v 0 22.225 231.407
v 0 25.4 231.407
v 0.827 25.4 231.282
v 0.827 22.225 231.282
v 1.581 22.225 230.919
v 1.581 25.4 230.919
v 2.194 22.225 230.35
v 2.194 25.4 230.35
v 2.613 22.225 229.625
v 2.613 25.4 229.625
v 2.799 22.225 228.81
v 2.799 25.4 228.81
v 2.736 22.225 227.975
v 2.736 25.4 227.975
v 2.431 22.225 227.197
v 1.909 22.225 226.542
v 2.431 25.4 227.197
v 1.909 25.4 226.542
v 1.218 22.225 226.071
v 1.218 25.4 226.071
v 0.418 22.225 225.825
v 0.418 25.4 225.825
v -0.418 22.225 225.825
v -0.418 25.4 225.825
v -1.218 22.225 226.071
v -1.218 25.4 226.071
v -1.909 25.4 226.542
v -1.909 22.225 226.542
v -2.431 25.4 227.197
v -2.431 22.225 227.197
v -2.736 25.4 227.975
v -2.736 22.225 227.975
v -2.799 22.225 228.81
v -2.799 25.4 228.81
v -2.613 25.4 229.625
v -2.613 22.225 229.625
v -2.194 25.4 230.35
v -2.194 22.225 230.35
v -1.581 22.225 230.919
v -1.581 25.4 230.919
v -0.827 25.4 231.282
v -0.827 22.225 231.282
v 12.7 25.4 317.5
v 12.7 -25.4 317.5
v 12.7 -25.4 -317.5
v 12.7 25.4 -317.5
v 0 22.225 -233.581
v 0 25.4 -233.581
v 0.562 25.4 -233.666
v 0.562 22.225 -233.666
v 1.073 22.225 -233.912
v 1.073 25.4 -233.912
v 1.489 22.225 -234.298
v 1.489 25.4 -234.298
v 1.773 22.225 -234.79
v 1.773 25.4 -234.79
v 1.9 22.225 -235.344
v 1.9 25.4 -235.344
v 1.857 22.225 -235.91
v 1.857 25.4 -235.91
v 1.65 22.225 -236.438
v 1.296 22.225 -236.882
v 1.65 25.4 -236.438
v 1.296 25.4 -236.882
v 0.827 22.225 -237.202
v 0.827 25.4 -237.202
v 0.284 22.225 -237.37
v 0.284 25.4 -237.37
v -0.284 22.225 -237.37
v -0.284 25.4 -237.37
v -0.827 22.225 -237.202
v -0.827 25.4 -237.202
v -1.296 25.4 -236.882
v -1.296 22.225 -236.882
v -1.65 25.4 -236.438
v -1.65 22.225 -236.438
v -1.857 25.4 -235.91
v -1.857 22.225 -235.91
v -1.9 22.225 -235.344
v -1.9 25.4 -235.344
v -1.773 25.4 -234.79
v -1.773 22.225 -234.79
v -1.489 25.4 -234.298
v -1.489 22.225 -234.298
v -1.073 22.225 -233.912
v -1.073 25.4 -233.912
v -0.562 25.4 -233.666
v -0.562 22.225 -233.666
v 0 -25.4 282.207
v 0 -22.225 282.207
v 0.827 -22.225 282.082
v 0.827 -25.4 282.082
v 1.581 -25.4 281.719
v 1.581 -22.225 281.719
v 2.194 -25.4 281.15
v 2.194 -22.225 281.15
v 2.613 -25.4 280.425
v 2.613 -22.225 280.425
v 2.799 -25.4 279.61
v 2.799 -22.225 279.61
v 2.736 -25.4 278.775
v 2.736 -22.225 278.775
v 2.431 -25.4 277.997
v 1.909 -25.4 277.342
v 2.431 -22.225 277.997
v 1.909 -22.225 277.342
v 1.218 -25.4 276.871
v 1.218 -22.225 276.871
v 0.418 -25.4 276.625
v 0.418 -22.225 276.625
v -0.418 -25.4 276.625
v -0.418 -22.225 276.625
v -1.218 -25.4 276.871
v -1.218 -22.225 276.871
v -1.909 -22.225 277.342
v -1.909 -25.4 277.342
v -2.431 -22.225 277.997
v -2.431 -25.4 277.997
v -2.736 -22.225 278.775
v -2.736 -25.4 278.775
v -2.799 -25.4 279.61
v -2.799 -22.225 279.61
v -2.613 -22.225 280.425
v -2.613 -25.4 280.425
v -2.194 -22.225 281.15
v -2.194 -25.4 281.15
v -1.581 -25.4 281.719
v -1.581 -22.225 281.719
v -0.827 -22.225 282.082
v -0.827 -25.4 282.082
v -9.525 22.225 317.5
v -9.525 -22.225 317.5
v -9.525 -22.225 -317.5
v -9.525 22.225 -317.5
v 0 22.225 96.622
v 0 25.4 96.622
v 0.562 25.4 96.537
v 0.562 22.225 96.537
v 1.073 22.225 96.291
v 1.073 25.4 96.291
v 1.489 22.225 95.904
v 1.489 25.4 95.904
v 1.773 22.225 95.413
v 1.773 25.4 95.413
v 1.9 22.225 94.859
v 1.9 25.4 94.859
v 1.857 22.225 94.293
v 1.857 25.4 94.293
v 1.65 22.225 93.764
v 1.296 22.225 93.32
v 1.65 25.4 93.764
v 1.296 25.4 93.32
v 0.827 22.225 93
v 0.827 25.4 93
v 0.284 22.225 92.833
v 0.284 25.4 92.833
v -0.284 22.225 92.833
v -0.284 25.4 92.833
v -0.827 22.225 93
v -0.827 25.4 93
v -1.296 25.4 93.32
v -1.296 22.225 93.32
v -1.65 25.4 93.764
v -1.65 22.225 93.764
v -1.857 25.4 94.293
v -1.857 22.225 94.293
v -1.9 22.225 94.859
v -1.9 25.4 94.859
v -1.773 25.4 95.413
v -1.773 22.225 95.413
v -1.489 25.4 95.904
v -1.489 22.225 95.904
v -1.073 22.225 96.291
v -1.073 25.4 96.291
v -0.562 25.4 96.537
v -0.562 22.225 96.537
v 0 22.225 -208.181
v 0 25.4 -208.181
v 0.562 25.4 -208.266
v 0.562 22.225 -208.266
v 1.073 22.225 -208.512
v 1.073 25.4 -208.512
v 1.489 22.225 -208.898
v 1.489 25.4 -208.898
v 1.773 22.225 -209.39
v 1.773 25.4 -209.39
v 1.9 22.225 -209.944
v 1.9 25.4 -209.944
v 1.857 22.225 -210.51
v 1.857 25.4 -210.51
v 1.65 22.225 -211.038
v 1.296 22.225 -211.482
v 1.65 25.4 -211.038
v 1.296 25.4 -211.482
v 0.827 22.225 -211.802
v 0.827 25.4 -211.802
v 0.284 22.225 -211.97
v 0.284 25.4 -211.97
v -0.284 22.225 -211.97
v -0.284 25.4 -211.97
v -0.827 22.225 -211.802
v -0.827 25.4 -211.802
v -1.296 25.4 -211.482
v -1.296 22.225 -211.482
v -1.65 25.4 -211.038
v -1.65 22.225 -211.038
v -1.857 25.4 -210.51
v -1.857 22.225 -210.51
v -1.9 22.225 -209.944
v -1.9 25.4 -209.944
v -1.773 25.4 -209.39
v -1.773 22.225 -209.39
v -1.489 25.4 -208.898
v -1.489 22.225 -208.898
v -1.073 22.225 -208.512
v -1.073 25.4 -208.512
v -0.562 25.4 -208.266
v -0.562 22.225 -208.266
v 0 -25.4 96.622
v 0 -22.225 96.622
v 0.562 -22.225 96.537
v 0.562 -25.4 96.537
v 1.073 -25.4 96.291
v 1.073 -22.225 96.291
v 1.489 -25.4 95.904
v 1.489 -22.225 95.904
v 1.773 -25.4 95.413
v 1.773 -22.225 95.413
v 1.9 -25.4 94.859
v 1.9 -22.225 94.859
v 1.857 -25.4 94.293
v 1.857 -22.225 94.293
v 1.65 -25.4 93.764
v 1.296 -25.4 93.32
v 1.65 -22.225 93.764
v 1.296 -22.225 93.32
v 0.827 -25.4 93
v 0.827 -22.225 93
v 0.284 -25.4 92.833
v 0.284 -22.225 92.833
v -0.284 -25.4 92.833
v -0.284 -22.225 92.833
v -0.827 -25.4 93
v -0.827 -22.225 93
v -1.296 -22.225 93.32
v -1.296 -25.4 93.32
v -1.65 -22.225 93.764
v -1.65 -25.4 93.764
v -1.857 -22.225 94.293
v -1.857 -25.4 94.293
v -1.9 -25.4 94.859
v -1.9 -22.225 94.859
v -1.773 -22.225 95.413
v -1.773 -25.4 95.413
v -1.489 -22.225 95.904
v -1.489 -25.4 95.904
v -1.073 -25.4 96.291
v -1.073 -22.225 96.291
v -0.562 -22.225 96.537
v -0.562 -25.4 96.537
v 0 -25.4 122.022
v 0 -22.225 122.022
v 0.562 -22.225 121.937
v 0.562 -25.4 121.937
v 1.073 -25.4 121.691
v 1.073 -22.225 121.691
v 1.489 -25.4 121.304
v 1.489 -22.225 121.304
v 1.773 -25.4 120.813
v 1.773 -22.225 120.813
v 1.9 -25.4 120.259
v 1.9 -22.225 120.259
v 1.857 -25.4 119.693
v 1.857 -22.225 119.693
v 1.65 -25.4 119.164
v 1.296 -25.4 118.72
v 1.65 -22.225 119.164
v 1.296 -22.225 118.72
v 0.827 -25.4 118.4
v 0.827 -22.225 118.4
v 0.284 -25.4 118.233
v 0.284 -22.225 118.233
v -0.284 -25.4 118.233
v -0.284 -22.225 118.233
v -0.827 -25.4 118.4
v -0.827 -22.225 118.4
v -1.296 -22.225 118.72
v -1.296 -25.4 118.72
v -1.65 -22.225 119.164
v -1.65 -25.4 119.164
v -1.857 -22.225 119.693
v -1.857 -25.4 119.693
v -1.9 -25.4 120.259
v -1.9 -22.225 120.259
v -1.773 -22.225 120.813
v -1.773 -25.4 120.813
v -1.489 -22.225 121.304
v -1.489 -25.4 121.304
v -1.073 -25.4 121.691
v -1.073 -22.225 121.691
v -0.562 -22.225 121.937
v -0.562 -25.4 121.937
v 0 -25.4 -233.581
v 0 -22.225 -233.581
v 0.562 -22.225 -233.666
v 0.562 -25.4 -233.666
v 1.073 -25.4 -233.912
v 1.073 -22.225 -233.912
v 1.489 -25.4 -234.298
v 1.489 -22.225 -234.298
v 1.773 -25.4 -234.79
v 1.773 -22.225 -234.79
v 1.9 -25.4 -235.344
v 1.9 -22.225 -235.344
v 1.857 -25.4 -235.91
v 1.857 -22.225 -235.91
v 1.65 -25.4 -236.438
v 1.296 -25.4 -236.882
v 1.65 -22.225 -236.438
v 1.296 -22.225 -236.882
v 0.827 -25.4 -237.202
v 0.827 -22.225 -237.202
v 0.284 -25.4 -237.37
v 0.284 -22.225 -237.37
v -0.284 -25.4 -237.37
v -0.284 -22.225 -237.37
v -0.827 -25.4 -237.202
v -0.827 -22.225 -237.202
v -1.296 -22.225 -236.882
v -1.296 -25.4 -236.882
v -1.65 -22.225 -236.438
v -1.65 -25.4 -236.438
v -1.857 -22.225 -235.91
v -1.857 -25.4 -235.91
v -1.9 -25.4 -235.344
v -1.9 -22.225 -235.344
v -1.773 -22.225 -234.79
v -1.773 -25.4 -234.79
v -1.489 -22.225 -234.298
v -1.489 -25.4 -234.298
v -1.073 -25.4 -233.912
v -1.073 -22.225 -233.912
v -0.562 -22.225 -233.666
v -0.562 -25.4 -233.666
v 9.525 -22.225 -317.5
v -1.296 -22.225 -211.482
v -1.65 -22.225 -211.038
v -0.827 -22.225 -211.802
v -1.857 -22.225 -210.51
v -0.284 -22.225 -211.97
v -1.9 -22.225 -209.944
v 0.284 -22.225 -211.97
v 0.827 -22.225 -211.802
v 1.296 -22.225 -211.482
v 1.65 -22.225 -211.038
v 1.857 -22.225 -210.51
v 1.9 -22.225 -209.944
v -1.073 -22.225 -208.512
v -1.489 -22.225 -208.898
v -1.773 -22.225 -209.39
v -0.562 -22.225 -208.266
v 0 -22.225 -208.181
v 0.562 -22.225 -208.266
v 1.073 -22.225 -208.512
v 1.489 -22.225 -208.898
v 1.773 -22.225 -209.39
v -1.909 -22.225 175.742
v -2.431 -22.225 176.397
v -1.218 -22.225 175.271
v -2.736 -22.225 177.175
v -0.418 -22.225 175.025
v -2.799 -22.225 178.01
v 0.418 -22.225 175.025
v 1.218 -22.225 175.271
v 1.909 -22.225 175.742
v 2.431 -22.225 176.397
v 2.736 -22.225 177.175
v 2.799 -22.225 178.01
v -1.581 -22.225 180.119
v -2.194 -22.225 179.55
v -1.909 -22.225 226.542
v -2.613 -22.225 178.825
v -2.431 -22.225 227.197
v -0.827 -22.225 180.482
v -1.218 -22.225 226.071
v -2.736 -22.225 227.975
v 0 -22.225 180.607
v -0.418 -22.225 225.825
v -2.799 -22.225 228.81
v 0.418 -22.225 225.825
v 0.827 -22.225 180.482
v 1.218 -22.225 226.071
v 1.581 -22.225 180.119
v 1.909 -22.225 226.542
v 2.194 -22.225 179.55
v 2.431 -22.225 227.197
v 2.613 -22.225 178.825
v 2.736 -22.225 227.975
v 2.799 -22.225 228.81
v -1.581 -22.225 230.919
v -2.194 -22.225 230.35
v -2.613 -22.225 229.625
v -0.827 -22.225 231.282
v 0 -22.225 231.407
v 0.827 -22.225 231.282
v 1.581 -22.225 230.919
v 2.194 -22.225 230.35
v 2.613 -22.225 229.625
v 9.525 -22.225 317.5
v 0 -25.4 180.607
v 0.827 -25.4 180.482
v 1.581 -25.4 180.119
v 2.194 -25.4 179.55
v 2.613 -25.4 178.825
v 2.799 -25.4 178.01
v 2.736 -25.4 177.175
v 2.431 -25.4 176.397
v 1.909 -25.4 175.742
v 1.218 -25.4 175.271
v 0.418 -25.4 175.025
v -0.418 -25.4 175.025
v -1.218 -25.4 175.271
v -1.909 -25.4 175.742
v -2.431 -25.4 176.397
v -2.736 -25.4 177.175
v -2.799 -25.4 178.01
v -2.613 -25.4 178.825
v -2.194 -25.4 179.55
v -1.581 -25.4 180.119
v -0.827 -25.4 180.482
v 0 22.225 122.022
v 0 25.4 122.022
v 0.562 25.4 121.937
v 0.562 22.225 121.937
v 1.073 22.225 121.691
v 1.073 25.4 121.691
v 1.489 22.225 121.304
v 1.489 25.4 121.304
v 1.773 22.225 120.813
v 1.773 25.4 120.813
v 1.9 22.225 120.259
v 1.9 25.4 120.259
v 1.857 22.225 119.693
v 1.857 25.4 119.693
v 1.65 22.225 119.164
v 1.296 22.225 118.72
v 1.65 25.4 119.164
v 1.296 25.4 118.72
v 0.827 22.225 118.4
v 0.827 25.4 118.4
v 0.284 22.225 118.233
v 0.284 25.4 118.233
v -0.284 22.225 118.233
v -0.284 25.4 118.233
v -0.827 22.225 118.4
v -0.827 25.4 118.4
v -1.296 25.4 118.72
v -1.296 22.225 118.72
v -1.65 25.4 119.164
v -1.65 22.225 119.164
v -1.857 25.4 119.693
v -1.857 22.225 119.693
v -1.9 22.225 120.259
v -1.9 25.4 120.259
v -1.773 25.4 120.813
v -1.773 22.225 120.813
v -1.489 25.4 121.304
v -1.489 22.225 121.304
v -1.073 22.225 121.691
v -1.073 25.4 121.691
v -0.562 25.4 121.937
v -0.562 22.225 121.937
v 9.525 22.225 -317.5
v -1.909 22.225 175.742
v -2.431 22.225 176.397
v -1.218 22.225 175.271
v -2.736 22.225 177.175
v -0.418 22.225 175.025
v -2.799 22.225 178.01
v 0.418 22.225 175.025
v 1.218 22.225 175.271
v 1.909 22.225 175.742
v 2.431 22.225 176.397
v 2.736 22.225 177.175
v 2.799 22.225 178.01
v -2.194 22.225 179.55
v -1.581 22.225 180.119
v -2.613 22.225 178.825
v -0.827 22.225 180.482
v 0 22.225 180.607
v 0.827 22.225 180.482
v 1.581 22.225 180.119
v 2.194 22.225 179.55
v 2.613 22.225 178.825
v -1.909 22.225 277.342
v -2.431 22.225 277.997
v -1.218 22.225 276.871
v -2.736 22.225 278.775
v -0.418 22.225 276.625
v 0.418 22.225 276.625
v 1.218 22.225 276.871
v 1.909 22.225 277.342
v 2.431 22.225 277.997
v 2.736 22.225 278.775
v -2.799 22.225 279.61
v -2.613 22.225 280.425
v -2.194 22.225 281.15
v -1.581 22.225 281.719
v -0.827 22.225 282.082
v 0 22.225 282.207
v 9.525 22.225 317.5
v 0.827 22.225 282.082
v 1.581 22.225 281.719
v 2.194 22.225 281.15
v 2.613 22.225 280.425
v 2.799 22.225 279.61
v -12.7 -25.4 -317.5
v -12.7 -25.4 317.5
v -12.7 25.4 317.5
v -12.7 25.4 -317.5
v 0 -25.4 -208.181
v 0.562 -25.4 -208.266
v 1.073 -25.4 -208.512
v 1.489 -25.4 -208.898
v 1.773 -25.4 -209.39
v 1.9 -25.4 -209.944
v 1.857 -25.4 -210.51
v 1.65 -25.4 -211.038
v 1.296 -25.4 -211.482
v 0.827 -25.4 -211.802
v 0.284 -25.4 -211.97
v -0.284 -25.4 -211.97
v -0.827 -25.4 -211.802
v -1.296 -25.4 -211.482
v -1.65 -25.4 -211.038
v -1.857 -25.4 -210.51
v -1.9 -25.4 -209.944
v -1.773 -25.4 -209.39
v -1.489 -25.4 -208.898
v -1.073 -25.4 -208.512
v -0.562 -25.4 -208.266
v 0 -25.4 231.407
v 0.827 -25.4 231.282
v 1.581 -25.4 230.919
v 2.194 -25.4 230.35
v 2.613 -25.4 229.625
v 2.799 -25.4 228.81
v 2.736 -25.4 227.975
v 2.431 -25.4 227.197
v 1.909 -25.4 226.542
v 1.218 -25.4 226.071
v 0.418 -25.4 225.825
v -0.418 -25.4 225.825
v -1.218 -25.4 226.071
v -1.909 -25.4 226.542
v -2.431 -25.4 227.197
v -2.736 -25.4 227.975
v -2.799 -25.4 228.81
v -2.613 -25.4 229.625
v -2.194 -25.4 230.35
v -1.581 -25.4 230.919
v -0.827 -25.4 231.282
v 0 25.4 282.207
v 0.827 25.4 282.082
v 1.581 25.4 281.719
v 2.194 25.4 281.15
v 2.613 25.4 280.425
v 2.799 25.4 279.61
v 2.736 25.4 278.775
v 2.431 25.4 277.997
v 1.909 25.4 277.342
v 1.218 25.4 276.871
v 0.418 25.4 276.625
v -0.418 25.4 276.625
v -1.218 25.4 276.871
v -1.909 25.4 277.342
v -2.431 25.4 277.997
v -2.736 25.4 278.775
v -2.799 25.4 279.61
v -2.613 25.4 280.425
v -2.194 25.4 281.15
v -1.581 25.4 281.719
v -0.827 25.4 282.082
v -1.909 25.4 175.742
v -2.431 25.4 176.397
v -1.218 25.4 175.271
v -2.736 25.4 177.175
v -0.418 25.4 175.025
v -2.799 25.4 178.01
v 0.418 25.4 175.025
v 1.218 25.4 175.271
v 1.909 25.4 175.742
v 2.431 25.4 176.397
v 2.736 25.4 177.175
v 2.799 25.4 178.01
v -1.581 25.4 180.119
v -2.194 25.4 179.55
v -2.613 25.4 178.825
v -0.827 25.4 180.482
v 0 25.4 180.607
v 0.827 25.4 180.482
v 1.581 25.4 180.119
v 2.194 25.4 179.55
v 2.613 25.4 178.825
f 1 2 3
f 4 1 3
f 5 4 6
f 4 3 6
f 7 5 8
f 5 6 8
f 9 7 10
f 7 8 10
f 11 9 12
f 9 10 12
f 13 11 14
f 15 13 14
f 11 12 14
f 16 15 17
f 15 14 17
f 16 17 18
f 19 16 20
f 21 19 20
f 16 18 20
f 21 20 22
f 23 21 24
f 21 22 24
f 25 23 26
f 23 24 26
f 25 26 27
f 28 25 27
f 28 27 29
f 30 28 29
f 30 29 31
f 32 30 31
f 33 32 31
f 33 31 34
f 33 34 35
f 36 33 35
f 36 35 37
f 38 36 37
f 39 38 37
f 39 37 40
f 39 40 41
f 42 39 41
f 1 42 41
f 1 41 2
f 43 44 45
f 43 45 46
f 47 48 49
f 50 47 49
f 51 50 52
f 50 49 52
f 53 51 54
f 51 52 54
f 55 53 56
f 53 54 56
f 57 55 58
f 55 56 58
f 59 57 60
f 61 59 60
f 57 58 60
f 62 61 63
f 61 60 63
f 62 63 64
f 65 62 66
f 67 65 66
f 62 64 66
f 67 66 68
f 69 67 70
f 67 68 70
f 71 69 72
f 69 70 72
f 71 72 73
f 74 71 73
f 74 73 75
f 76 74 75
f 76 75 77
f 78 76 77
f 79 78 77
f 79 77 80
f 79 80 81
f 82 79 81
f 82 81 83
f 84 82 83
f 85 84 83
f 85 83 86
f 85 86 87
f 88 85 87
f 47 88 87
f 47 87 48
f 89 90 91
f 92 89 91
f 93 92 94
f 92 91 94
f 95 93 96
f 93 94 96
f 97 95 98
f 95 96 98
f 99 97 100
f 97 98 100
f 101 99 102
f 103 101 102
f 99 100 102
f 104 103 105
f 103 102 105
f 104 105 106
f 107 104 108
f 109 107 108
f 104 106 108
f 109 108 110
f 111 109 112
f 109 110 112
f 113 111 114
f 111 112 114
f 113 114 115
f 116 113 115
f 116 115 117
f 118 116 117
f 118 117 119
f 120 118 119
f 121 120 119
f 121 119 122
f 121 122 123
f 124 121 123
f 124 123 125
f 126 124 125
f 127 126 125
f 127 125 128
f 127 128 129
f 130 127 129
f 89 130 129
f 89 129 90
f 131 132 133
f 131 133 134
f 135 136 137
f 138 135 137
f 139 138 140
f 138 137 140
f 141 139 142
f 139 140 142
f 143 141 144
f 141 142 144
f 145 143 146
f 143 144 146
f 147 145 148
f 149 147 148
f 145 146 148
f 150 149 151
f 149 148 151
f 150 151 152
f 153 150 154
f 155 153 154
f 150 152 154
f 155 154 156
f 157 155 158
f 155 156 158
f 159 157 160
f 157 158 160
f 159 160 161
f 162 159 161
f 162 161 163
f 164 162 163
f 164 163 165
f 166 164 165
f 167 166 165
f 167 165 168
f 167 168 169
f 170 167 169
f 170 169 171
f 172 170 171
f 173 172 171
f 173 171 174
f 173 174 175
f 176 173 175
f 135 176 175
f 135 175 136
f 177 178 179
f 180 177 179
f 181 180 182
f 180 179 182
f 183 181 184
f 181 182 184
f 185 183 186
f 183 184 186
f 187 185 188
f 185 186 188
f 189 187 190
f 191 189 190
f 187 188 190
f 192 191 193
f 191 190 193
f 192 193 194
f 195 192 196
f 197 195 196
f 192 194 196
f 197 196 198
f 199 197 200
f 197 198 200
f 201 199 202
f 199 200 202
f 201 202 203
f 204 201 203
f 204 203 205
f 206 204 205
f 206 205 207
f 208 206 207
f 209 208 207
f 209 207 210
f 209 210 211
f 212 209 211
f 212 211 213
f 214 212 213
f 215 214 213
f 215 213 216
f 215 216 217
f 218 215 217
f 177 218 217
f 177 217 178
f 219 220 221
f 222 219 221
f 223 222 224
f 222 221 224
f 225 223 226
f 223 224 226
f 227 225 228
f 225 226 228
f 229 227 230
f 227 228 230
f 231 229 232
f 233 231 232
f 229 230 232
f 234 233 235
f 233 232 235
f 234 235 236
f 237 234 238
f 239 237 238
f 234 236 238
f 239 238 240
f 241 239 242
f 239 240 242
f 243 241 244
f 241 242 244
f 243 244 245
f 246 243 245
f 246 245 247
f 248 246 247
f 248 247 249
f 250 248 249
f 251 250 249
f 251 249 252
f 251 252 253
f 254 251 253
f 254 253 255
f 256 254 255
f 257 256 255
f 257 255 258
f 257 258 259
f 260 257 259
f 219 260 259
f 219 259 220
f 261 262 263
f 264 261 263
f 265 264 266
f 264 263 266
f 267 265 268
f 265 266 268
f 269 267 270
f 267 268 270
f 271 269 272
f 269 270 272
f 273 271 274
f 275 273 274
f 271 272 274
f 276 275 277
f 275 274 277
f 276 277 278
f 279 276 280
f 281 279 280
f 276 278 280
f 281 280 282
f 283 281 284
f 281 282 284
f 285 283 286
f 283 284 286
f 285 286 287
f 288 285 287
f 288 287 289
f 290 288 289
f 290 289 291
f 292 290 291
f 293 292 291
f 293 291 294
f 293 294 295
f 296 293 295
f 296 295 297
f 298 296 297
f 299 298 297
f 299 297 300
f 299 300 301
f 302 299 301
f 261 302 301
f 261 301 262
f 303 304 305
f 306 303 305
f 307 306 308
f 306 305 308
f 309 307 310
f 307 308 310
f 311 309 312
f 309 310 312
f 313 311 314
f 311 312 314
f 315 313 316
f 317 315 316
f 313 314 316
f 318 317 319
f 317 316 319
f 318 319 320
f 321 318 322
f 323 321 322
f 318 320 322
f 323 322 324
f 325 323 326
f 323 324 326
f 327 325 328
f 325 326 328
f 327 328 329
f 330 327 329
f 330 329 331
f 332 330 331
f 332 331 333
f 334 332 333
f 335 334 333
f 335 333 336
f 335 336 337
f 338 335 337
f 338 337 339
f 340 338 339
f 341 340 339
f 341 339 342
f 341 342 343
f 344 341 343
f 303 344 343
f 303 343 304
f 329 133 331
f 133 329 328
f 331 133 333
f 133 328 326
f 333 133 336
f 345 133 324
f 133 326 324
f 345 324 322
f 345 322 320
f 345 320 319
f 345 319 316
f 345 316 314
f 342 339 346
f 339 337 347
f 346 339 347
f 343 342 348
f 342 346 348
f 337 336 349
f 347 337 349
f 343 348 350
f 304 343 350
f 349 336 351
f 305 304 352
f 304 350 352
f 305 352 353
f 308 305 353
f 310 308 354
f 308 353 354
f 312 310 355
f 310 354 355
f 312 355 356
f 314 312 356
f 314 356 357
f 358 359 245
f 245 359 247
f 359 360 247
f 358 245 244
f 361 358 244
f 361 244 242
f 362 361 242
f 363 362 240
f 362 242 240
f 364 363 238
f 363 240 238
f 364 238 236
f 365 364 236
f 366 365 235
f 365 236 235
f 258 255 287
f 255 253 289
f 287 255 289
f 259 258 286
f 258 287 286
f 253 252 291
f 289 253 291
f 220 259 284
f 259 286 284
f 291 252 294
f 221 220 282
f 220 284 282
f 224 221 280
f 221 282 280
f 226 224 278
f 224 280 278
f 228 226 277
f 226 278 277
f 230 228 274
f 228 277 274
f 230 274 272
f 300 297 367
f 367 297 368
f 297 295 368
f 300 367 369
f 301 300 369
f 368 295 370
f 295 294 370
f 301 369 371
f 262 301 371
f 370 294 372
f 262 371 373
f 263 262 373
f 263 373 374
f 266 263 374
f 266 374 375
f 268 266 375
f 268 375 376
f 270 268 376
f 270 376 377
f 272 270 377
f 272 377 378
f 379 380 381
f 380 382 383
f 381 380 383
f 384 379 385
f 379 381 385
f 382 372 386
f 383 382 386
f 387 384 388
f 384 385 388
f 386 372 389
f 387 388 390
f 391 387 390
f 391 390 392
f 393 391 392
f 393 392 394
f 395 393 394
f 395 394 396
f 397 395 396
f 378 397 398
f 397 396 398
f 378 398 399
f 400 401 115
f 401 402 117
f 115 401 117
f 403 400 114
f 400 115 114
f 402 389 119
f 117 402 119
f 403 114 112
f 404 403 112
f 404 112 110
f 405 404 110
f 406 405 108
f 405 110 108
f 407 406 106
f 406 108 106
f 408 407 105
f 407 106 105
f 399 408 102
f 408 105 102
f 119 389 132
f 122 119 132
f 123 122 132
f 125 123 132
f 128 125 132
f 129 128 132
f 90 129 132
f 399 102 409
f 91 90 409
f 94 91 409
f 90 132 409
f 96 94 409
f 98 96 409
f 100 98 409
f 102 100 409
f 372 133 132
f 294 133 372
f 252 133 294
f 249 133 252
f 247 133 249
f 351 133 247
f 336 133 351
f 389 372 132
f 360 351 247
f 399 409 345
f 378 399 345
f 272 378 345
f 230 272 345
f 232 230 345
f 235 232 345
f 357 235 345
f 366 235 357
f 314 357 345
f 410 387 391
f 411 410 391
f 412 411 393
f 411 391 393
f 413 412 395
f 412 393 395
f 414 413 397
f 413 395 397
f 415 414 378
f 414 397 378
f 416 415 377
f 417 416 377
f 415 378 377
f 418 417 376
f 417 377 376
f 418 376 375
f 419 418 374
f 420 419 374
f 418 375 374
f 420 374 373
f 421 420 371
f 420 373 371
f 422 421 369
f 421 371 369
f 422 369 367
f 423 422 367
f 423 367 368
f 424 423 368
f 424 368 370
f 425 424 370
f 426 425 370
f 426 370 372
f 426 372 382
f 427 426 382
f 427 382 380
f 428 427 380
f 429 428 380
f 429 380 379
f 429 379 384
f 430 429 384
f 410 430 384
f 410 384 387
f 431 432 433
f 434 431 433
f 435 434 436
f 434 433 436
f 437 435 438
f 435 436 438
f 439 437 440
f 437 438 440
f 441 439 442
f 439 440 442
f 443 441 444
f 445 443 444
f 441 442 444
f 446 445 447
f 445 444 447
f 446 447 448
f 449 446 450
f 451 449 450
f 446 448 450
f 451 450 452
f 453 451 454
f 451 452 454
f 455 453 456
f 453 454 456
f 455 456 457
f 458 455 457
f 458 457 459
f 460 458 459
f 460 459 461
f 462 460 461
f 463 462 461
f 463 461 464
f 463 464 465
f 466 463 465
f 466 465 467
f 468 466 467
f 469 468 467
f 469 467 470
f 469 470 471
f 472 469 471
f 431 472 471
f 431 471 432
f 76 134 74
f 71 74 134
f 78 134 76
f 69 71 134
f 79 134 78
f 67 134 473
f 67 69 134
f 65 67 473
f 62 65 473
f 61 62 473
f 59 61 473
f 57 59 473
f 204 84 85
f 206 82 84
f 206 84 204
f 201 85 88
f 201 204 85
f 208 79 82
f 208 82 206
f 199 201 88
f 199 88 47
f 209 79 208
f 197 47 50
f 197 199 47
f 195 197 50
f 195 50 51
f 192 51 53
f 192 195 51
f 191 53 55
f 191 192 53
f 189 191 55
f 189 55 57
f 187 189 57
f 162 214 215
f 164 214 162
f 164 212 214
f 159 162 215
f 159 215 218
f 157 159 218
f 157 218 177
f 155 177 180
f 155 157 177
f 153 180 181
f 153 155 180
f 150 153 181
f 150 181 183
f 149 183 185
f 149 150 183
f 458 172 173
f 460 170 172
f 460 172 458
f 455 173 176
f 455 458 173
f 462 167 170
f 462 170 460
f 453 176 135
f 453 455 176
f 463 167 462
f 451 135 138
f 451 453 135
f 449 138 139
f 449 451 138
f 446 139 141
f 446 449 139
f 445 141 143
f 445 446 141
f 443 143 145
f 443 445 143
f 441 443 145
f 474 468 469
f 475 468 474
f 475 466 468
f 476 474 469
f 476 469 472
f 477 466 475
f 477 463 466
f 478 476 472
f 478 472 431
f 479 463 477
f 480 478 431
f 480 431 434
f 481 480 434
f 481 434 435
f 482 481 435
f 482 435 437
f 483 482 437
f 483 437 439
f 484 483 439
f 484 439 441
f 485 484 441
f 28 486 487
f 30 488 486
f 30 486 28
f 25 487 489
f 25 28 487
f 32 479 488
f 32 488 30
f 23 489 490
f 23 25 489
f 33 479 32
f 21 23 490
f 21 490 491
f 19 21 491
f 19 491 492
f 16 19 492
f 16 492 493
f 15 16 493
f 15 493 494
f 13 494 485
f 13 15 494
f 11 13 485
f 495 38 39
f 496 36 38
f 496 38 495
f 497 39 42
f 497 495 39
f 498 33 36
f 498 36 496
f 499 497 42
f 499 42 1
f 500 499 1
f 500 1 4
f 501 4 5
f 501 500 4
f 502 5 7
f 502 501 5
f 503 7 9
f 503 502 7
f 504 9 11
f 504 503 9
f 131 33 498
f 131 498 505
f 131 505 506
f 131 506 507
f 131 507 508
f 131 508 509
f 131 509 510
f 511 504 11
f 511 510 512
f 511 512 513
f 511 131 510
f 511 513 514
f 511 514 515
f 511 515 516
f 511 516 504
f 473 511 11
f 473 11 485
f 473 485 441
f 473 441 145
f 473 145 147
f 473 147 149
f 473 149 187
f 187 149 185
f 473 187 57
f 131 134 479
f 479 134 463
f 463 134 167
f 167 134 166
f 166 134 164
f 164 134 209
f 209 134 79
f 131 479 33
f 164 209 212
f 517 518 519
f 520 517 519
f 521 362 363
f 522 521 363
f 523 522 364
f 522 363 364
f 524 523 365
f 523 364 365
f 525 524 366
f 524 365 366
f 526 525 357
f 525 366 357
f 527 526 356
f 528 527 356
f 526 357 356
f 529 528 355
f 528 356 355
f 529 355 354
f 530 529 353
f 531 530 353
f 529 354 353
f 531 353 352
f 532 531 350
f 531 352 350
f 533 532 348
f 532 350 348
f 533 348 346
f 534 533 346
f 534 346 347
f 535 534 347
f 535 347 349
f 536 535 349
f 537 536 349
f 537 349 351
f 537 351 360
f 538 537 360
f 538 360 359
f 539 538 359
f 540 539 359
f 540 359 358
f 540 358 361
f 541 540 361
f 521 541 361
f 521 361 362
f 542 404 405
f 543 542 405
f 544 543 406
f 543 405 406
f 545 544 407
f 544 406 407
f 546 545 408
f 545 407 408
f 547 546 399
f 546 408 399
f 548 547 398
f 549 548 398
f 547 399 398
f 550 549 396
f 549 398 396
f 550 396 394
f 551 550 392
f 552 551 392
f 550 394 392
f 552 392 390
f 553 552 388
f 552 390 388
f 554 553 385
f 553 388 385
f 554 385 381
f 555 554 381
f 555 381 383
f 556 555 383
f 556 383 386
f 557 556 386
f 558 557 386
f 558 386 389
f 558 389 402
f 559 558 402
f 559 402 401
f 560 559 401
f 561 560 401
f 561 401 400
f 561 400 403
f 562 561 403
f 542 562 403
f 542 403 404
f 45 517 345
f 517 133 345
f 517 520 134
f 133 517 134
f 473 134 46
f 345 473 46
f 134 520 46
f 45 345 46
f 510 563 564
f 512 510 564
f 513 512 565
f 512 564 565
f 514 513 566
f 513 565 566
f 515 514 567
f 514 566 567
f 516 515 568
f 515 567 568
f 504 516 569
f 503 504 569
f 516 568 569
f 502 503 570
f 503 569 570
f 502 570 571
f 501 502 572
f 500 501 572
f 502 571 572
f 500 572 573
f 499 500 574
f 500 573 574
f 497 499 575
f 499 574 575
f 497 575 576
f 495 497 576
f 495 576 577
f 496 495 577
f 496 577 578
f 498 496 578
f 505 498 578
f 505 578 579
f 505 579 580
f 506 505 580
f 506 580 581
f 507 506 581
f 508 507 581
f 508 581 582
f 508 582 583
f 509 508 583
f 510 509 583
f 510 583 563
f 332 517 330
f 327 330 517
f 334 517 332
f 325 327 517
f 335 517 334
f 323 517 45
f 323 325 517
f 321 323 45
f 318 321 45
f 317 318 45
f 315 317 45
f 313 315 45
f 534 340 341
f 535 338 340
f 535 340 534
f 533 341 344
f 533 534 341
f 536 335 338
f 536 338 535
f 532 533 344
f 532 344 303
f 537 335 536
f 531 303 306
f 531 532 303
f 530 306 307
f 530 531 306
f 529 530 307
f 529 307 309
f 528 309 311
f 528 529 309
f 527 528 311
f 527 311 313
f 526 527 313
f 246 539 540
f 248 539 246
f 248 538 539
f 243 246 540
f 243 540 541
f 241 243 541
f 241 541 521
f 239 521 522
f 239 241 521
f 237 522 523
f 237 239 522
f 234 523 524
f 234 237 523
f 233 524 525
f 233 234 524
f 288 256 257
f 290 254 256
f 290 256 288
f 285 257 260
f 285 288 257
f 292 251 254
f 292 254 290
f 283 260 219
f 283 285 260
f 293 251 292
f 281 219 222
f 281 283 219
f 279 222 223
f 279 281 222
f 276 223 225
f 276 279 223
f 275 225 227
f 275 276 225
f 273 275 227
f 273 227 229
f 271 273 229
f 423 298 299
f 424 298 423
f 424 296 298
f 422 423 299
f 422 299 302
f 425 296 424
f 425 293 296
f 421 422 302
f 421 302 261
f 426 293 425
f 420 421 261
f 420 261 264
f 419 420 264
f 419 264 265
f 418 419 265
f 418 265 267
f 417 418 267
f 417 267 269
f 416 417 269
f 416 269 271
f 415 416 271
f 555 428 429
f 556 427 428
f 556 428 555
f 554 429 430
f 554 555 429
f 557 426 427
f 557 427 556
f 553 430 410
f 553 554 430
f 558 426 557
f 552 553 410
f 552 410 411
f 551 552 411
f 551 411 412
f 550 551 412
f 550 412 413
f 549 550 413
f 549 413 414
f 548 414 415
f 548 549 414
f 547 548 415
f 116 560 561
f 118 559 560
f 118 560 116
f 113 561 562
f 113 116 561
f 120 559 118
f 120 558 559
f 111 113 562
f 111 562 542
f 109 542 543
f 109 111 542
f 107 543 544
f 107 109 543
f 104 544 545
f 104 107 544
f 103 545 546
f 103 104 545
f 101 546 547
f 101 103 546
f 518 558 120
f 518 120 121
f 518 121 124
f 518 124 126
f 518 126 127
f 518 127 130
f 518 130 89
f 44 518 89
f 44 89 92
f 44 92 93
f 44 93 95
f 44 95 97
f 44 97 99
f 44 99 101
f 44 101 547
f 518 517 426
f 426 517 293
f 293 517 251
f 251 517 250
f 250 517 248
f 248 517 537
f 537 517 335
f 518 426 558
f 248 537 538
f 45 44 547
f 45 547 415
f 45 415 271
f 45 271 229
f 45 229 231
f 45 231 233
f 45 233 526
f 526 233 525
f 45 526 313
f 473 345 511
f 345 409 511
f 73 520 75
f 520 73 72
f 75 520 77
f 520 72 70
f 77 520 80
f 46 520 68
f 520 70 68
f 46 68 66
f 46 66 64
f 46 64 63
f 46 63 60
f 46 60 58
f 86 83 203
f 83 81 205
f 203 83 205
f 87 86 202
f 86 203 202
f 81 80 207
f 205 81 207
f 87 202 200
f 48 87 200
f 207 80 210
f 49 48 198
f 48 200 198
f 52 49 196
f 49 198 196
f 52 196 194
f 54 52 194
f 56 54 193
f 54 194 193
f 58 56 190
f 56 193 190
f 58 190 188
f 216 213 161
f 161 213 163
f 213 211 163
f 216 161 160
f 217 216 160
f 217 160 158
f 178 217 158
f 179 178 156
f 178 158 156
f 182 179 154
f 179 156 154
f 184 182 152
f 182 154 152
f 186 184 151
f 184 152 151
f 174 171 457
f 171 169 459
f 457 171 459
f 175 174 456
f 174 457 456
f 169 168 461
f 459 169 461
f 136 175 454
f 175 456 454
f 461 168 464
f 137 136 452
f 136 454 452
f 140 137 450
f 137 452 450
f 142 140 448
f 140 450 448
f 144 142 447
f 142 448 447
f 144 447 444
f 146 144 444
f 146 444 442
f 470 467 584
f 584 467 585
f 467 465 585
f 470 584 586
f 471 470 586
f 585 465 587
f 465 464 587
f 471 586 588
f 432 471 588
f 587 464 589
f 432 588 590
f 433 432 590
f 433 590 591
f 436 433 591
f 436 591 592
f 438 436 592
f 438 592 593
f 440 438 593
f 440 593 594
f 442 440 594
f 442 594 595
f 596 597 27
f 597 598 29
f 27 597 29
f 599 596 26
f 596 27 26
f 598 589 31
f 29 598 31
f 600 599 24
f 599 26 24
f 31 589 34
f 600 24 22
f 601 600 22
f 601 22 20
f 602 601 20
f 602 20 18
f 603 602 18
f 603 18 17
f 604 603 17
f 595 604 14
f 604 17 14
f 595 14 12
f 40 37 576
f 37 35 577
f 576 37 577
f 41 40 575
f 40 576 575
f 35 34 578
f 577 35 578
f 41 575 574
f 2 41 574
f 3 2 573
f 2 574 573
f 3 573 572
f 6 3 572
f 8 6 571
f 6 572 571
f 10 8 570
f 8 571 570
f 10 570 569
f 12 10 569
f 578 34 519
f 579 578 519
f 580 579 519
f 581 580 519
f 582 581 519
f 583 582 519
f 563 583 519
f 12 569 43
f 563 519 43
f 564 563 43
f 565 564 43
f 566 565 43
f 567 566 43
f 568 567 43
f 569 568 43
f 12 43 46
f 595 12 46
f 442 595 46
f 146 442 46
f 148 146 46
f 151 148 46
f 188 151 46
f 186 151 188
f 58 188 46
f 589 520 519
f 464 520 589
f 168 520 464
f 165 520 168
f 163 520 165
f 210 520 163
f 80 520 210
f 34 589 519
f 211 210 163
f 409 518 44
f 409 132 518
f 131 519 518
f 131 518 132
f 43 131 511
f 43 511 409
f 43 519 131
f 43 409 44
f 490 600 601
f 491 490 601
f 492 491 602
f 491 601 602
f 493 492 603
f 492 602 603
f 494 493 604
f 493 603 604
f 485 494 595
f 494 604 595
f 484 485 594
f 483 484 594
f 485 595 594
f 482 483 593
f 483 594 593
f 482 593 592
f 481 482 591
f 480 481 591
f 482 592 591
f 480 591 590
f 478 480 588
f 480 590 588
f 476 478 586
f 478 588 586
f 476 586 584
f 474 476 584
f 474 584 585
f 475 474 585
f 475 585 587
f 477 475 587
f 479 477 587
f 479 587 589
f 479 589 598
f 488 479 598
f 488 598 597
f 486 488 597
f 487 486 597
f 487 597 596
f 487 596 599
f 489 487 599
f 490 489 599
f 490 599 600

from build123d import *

# Parameters (mm, degrees)
SKETCH1_W           = 25.4
SKETCH1_H           = 50.8
SKETCH1_W_2         = 19.05
SKETCH1_H_2         = 44.45
BOSS_EXTRUDE1_DEPTH = 317.5
SKETCH2_R           = 1.905
CUT_EXTRUDE1_DEPTH  = 322.789030267
SKETCH3_R           = 2.1971
SKETCH3_R_2         = 2.8067
CUT_EXTRUDE2_DEPTH  = 322.789030267


with BuildPart() as part:
    # Sketch1 → Boss-Extrude1 (new, symmetric)
    with BuildSketch(Plane.XY):
        Rectangle(SKETCH1_W, SKETCH1_H)
        Rectangle(SKETCH1_W_2, SKETCH1_H_2, mode=Mode.SUBTRACT)
    extrude(amount=BOSS_EXTRUDE1_DEPTH, both=True)

    # Sketch2 → Cut-Extrude1 (cut, through all)
    with BuildSketch(Plane(origin=(0, 25.4, 0), x_dir=(1, 0, 0), z_dir=(0, 1, 0))):
        with Locations(Location((0, -120.1166, 0), (0, 0, 270))):
            Circle(SKETCH2_R)
        with Locations(Location((0, -94.7166, 0), (0, 0, 270))):
            Circle(SKETCH2_R)
        with Locations(Location((0, 235.48594, 0), (0, 0, 270))):
            Circle(SKETCH2_R)
        with Locations(Location((0, 210.08594, 0), (0, 0, 270))):
            Circle(SKETCH2_R)
    extrude(amount=-CUT_EXTRUDE1_DEPTH, mode=Mode.SUBTRACT)

    # Sketch3 → Cut-Extrude2 (cut, through all)
    with BuildSketch(Plane(origin=(0, 25.4, 0), x_dir=(1, 0, 0), z_dir=(0, 1, 0))):
        with Locations((673.1, -279.399917536)):
            Circle(SKETCH3_R)
        with Locations((673.1, -228.599917536)):
            Circle(SKETCH3_R)
        with Locations((673.1, -177.799917536)):
            Circle(SKETCH3_R)
        with Locations(Location((0, -279.399917536, 0), (0, 0, 270))):
            Circle(SKETCH3_R_2)
        with Locations(Location((0, -228.599917536, 0), (0, 0, 270))):
            Circle(SKETCH3_R_2)
        with Locations(Location((0, -177.799917536, 0), (0, 0, 270))):
            Circle(SKETCH3_R_2)
    extrude(amount=-CUT_EXTRUDE2_DEPTH, mode=Mode.SUBTRACT)


solid = part.part
